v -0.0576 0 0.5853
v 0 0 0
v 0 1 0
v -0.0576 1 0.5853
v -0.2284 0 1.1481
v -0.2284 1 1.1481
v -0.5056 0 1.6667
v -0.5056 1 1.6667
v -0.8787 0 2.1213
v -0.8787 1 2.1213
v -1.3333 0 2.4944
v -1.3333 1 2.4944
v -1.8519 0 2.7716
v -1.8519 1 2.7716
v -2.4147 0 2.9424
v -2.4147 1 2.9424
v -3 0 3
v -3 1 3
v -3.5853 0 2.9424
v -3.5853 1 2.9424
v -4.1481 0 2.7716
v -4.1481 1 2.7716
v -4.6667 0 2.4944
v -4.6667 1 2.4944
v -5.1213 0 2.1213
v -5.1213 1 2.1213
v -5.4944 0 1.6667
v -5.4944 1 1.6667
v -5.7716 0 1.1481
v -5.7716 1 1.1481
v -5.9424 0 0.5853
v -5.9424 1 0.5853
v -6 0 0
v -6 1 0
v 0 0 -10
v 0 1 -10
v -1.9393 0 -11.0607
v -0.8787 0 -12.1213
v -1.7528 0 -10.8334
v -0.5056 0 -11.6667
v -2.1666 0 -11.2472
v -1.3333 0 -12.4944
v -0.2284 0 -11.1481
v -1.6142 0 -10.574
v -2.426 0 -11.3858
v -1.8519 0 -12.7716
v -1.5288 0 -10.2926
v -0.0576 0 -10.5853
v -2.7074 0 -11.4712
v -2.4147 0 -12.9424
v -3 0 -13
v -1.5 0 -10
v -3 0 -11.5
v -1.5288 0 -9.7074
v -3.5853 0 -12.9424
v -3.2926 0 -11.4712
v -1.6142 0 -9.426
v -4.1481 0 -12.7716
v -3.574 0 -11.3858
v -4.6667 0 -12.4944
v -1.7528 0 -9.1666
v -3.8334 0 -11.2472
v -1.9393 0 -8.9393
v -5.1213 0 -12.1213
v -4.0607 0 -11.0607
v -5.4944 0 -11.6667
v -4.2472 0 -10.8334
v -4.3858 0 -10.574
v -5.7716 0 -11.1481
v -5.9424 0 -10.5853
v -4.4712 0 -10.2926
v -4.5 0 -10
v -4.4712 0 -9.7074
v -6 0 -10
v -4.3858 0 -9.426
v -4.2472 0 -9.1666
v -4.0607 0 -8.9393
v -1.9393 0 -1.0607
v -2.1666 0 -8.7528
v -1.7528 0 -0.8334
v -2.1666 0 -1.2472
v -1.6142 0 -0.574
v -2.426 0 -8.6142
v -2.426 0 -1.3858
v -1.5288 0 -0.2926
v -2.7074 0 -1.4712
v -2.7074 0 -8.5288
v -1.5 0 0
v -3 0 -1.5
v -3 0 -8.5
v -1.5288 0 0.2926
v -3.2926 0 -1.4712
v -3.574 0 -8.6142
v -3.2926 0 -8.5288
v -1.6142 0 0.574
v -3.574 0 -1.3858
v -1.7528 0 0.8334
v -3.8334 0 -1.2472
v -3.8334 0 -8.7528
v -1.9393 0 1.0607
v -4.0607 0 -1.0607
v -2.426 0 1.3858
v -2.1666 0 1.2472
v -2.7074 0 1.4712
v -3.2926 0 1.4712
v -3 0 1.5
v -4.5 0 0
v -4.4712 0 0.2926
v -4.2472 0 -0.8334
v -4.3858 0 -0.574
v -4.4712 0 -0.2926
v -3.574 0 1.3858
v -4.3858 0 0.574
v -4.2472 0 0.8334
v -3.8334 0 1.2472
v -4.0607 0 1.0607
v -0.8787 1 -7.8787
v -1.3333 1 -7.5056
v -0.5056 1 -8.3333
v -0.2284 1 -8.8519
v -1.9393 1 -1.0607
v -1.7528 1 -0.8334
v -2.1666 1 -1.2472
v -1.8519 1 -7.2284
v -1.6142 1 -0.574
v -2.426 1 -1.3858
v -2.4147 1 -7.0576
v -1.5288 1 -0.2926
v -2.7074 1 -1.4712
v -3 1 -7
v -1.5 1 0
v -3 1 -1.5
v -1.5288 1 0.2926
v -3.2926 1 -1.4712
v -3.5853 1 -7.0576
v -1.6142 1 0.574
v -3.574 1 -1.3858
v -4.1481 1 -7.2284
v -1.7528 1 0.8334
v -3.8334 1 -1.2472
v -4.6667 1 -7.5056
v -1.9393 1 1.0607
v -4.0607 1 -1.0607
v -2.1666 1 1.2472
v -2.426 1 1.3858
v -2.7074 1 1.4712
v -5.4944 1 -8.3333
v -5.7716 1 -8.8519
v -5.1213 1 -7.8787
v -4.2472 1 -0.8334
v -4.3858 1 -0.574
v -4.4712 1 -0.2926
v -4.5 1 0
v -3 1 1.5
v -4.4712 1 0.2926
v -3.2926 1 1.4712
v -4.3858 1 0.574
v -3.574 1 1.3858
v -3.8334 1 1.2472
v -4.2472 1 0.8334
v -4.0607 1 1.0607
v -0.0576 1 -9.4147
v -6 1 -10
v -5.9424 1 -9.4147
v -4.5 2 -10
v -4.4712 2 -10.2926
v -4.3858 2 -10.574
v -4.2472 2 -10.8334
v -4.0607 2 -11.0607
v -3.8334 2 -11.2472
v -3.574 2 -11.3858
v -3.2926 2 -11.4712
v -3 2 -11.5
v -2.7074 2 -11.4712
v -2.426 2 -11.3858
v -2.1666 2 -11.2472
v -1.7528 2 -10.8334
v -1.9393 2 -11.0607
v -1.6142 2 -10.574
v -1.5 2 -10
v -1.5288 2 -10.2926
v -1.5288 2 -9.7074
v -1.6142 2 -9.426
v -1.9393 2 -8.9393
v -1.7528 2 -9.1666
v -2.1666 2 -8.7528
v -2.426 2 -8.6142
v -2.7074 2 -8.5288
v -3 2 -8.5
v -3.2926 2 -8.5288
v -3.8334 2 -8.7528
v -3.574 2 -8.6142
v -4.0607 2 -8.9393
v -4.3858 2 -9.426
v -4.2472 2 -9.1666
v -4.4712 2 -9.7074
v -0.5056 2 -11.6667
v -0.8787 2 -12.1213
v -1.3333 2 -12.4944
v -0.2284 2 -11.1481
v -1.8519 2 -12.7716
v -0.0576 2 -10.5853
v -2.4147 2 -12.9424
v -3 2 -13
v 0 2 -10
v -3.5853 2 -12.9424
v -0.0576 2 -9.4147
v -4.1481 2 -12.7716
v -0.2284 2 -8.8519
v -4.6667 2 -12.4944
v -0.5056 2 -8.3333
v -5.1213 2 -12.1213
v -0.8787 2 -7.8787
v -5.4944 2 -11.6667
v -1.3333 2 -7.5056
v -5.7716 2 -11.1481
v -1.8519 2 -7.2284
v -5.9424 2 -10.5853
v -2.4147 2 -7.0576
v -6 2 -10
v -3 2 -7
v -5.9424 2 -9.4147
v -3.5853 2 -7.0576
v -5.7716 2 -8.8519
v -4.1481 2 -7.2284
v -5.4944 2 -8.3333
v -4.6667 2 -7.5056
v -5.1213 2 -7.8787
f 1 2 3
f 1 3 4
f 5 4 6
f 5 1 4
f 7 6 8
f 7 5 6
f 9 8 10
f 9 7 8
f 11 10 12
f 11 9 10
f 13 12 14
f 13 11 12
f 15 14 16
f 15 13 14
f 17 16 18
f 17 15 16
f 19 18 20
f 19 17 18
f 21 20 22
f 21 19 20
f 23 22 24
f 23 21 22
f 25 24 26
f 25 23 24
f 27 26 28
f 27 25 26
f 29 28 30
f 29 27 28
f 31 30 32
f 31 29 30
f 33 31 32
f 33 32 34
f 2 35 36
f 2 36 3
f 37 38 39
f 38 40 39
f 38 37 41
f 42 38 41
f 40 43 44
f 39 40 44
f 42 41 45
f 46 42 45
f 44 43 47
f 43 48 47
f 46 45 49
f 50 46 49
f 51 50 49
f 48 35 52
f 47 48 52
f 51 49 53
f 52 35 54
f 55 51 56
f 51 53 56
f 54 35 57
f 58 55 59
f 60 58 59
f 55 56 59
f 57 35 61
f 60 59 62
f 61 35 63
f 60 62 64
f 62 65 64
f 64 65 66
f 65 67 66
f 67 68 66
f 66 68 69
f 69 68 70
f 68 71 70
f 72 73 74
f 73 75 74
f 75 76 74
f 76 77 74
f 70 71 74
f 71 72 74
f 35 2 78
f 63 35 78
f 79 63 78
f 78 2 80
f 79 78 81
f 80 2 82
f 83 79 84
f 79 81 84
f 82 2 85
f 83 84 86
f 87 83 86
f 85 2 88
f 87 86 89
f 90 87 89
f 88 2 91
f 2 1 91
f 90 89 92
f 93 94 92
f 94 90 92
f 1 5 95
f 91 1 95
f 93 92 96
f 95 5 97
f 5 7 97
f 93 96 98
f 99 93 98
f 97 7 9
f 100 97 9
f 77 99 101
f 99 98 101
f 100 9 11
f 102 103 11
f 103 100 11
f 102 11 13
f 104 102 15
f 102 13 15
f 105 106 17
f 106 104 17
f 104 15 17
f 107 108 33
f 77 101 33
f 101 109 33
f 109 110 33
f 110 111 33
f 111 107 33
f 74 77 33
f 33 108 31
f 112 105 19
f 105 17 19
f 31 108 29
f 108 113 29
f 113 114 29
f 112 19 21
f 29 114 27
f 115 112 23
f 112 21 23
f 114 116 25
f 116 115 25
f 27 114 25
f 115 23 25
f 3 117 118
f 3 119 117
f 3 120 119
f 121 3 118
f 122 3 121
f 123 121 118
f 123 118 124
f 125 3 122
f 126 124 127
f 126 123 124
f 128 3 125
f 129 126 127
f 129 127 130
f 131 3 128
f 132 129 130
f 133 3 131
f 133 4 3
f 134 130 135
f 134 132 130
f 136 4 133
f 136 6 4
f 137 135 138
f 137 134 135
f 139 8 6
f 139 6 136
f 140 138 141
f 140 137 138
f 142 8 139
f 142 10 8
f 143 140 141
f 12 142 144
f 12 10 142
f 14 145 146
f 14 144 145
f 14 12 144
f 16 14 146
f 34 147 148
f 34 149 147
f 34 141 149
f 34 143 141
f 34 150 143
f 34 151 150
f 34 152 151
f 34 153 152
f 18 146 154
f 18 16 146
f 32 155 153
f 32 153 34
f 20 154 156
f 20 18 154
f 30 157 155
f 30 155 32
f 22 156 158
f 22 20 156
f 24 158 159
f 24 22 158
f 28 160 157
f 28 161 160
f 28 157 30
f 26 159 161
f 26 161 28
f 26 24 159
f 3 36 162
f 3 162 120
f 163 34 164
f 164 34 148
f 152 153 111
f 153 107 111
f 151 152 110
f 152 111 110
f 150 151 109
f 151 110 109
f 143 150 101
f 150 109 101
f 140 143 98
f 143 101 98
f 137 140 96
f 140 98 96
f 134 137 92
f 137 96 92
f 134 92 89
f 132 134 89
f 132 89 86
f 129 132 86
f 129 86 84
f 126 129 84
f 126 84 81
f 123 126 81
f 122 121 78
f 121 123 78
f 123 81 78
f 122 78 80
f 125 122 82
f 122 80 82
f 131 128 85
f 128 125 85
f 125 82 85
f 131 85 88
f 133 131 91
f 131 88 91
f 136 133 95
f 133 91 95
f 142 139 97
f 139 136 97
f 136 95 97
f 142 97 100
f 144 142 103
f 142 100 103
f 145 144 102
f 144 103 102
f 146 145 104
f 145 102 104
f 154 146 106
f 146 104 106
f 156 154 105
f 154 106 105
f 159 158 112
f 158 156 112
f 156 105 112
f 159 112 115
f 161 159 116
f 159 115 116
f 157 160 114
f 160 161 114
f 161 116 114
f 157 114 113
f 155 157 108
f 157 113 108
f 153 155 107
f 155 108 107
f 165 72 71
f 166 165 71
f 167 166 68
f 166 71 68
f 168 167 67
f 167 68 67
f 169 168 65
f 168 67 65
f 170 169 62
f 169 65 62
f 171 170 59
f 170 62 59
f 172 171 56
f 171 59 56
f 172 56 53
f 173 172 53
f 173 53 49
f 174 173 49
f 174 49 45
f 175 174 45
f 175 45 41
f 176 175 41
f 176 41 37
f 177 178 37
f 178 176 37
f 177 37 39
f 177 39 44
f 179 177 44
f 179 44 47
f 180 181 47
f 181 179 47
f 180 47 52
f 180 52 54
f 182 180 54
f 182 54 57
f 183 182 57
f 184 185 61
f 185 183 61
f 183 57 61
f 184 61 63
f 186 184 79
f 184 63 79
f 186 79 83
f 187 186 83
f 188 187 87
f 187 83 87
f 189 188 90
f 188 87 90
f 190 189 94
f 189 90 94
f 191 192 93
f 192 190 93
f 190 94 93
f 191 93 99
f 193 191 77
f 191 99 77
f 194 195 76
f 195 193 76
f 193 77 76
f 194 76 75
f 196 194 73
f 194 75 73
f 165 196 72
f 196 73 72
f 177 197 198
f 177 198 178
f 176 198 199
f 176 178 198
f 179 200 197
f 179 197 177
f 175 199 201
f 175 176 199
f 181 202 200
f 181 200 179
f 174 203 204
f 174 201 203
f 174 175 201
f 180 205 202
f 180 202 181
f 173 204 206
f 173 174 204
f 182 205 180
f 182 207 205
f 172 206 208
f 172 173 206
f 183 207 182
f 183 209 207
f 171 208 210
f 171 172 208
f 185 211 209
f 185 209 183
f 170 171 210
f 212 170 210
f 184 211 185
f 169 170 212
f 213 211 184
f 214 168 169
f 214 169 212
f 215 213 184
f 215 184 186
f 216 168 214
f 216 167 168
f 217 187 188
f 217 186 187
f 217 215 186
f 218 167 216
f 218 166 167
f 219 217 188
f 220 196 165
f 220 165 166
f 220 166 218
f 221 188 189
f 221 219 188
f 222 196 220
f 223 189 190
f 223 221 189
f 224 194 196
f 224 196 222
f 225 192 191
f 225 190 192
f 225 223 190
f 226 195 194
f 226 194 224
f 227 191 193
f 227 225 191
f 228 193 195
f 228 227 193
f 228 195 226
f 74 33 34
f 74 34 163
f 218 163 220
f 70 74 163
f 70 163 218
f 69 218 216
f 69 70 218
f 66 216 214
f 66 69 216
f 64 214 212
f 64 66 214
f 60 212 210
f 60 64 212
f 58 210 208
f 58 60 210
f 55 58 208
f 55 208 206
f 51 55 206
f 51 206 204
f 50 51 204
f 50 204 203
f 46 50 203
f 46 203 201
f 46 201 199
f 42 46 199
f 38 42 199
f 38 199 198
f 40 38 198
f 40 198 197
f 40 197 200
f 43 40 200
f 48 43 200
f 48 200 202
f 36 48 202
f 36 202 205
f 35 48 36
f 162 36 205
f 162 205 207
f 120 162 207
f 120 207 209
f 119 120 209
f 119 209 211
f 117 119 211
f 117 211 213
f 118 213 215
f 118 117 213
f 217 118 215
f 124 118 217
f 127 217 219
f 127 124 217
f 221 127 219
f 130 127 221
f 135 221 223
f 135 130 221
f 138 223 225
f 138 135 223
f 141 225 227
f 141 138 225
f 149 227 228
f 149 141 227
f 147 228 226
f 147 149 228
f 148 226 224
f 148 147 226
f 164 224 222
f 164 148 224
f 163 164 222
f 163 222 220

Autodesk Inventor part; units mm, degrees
ref_plane "YZ Plane" through (0, 0, 0) normal (1, 0, 0) x (0, 1, 0)
ref_plane "XZ Plane" through (0, 0, 0) normal (0, 1, 0) x (-1, 0, 0)
ref_plane "XY Plane" through (0, 0, 0) normal (0, 0, 1) x (1, 0, 0)
sketch "Sketch2" plane through (0, 0, 0) normal (0, 1, 0) x (-1, 0, 0)
  circle A0 centre (3, 0) radius 1.5
  circle A1 centre (3, 0) radius 3
  circle A2 centre (3, -10) radius 1.5
  circle A3 centre (3, -10) radius 3
  line L0 (6, 0) -> (6, -10)
  line L1 (0, -10) -> (0, 0)
  dimension "d40" = 6
  dimension "d39" = 3
  dimension "d41" = 3
  dimension "d42" = 6
extrude "Extrusion6" add sketch "Sketch2" along normal blind 1 contours A1 | L0 A3 L1 A1
extrude "Extrusion7" add sketch "Sketch2" along normal blind 2 contours A3
thread "Thread1" size "M3x0.35" class "6H" standard "ANSI Metric M Profile" length 1
properties part number "linkToActuator5"
